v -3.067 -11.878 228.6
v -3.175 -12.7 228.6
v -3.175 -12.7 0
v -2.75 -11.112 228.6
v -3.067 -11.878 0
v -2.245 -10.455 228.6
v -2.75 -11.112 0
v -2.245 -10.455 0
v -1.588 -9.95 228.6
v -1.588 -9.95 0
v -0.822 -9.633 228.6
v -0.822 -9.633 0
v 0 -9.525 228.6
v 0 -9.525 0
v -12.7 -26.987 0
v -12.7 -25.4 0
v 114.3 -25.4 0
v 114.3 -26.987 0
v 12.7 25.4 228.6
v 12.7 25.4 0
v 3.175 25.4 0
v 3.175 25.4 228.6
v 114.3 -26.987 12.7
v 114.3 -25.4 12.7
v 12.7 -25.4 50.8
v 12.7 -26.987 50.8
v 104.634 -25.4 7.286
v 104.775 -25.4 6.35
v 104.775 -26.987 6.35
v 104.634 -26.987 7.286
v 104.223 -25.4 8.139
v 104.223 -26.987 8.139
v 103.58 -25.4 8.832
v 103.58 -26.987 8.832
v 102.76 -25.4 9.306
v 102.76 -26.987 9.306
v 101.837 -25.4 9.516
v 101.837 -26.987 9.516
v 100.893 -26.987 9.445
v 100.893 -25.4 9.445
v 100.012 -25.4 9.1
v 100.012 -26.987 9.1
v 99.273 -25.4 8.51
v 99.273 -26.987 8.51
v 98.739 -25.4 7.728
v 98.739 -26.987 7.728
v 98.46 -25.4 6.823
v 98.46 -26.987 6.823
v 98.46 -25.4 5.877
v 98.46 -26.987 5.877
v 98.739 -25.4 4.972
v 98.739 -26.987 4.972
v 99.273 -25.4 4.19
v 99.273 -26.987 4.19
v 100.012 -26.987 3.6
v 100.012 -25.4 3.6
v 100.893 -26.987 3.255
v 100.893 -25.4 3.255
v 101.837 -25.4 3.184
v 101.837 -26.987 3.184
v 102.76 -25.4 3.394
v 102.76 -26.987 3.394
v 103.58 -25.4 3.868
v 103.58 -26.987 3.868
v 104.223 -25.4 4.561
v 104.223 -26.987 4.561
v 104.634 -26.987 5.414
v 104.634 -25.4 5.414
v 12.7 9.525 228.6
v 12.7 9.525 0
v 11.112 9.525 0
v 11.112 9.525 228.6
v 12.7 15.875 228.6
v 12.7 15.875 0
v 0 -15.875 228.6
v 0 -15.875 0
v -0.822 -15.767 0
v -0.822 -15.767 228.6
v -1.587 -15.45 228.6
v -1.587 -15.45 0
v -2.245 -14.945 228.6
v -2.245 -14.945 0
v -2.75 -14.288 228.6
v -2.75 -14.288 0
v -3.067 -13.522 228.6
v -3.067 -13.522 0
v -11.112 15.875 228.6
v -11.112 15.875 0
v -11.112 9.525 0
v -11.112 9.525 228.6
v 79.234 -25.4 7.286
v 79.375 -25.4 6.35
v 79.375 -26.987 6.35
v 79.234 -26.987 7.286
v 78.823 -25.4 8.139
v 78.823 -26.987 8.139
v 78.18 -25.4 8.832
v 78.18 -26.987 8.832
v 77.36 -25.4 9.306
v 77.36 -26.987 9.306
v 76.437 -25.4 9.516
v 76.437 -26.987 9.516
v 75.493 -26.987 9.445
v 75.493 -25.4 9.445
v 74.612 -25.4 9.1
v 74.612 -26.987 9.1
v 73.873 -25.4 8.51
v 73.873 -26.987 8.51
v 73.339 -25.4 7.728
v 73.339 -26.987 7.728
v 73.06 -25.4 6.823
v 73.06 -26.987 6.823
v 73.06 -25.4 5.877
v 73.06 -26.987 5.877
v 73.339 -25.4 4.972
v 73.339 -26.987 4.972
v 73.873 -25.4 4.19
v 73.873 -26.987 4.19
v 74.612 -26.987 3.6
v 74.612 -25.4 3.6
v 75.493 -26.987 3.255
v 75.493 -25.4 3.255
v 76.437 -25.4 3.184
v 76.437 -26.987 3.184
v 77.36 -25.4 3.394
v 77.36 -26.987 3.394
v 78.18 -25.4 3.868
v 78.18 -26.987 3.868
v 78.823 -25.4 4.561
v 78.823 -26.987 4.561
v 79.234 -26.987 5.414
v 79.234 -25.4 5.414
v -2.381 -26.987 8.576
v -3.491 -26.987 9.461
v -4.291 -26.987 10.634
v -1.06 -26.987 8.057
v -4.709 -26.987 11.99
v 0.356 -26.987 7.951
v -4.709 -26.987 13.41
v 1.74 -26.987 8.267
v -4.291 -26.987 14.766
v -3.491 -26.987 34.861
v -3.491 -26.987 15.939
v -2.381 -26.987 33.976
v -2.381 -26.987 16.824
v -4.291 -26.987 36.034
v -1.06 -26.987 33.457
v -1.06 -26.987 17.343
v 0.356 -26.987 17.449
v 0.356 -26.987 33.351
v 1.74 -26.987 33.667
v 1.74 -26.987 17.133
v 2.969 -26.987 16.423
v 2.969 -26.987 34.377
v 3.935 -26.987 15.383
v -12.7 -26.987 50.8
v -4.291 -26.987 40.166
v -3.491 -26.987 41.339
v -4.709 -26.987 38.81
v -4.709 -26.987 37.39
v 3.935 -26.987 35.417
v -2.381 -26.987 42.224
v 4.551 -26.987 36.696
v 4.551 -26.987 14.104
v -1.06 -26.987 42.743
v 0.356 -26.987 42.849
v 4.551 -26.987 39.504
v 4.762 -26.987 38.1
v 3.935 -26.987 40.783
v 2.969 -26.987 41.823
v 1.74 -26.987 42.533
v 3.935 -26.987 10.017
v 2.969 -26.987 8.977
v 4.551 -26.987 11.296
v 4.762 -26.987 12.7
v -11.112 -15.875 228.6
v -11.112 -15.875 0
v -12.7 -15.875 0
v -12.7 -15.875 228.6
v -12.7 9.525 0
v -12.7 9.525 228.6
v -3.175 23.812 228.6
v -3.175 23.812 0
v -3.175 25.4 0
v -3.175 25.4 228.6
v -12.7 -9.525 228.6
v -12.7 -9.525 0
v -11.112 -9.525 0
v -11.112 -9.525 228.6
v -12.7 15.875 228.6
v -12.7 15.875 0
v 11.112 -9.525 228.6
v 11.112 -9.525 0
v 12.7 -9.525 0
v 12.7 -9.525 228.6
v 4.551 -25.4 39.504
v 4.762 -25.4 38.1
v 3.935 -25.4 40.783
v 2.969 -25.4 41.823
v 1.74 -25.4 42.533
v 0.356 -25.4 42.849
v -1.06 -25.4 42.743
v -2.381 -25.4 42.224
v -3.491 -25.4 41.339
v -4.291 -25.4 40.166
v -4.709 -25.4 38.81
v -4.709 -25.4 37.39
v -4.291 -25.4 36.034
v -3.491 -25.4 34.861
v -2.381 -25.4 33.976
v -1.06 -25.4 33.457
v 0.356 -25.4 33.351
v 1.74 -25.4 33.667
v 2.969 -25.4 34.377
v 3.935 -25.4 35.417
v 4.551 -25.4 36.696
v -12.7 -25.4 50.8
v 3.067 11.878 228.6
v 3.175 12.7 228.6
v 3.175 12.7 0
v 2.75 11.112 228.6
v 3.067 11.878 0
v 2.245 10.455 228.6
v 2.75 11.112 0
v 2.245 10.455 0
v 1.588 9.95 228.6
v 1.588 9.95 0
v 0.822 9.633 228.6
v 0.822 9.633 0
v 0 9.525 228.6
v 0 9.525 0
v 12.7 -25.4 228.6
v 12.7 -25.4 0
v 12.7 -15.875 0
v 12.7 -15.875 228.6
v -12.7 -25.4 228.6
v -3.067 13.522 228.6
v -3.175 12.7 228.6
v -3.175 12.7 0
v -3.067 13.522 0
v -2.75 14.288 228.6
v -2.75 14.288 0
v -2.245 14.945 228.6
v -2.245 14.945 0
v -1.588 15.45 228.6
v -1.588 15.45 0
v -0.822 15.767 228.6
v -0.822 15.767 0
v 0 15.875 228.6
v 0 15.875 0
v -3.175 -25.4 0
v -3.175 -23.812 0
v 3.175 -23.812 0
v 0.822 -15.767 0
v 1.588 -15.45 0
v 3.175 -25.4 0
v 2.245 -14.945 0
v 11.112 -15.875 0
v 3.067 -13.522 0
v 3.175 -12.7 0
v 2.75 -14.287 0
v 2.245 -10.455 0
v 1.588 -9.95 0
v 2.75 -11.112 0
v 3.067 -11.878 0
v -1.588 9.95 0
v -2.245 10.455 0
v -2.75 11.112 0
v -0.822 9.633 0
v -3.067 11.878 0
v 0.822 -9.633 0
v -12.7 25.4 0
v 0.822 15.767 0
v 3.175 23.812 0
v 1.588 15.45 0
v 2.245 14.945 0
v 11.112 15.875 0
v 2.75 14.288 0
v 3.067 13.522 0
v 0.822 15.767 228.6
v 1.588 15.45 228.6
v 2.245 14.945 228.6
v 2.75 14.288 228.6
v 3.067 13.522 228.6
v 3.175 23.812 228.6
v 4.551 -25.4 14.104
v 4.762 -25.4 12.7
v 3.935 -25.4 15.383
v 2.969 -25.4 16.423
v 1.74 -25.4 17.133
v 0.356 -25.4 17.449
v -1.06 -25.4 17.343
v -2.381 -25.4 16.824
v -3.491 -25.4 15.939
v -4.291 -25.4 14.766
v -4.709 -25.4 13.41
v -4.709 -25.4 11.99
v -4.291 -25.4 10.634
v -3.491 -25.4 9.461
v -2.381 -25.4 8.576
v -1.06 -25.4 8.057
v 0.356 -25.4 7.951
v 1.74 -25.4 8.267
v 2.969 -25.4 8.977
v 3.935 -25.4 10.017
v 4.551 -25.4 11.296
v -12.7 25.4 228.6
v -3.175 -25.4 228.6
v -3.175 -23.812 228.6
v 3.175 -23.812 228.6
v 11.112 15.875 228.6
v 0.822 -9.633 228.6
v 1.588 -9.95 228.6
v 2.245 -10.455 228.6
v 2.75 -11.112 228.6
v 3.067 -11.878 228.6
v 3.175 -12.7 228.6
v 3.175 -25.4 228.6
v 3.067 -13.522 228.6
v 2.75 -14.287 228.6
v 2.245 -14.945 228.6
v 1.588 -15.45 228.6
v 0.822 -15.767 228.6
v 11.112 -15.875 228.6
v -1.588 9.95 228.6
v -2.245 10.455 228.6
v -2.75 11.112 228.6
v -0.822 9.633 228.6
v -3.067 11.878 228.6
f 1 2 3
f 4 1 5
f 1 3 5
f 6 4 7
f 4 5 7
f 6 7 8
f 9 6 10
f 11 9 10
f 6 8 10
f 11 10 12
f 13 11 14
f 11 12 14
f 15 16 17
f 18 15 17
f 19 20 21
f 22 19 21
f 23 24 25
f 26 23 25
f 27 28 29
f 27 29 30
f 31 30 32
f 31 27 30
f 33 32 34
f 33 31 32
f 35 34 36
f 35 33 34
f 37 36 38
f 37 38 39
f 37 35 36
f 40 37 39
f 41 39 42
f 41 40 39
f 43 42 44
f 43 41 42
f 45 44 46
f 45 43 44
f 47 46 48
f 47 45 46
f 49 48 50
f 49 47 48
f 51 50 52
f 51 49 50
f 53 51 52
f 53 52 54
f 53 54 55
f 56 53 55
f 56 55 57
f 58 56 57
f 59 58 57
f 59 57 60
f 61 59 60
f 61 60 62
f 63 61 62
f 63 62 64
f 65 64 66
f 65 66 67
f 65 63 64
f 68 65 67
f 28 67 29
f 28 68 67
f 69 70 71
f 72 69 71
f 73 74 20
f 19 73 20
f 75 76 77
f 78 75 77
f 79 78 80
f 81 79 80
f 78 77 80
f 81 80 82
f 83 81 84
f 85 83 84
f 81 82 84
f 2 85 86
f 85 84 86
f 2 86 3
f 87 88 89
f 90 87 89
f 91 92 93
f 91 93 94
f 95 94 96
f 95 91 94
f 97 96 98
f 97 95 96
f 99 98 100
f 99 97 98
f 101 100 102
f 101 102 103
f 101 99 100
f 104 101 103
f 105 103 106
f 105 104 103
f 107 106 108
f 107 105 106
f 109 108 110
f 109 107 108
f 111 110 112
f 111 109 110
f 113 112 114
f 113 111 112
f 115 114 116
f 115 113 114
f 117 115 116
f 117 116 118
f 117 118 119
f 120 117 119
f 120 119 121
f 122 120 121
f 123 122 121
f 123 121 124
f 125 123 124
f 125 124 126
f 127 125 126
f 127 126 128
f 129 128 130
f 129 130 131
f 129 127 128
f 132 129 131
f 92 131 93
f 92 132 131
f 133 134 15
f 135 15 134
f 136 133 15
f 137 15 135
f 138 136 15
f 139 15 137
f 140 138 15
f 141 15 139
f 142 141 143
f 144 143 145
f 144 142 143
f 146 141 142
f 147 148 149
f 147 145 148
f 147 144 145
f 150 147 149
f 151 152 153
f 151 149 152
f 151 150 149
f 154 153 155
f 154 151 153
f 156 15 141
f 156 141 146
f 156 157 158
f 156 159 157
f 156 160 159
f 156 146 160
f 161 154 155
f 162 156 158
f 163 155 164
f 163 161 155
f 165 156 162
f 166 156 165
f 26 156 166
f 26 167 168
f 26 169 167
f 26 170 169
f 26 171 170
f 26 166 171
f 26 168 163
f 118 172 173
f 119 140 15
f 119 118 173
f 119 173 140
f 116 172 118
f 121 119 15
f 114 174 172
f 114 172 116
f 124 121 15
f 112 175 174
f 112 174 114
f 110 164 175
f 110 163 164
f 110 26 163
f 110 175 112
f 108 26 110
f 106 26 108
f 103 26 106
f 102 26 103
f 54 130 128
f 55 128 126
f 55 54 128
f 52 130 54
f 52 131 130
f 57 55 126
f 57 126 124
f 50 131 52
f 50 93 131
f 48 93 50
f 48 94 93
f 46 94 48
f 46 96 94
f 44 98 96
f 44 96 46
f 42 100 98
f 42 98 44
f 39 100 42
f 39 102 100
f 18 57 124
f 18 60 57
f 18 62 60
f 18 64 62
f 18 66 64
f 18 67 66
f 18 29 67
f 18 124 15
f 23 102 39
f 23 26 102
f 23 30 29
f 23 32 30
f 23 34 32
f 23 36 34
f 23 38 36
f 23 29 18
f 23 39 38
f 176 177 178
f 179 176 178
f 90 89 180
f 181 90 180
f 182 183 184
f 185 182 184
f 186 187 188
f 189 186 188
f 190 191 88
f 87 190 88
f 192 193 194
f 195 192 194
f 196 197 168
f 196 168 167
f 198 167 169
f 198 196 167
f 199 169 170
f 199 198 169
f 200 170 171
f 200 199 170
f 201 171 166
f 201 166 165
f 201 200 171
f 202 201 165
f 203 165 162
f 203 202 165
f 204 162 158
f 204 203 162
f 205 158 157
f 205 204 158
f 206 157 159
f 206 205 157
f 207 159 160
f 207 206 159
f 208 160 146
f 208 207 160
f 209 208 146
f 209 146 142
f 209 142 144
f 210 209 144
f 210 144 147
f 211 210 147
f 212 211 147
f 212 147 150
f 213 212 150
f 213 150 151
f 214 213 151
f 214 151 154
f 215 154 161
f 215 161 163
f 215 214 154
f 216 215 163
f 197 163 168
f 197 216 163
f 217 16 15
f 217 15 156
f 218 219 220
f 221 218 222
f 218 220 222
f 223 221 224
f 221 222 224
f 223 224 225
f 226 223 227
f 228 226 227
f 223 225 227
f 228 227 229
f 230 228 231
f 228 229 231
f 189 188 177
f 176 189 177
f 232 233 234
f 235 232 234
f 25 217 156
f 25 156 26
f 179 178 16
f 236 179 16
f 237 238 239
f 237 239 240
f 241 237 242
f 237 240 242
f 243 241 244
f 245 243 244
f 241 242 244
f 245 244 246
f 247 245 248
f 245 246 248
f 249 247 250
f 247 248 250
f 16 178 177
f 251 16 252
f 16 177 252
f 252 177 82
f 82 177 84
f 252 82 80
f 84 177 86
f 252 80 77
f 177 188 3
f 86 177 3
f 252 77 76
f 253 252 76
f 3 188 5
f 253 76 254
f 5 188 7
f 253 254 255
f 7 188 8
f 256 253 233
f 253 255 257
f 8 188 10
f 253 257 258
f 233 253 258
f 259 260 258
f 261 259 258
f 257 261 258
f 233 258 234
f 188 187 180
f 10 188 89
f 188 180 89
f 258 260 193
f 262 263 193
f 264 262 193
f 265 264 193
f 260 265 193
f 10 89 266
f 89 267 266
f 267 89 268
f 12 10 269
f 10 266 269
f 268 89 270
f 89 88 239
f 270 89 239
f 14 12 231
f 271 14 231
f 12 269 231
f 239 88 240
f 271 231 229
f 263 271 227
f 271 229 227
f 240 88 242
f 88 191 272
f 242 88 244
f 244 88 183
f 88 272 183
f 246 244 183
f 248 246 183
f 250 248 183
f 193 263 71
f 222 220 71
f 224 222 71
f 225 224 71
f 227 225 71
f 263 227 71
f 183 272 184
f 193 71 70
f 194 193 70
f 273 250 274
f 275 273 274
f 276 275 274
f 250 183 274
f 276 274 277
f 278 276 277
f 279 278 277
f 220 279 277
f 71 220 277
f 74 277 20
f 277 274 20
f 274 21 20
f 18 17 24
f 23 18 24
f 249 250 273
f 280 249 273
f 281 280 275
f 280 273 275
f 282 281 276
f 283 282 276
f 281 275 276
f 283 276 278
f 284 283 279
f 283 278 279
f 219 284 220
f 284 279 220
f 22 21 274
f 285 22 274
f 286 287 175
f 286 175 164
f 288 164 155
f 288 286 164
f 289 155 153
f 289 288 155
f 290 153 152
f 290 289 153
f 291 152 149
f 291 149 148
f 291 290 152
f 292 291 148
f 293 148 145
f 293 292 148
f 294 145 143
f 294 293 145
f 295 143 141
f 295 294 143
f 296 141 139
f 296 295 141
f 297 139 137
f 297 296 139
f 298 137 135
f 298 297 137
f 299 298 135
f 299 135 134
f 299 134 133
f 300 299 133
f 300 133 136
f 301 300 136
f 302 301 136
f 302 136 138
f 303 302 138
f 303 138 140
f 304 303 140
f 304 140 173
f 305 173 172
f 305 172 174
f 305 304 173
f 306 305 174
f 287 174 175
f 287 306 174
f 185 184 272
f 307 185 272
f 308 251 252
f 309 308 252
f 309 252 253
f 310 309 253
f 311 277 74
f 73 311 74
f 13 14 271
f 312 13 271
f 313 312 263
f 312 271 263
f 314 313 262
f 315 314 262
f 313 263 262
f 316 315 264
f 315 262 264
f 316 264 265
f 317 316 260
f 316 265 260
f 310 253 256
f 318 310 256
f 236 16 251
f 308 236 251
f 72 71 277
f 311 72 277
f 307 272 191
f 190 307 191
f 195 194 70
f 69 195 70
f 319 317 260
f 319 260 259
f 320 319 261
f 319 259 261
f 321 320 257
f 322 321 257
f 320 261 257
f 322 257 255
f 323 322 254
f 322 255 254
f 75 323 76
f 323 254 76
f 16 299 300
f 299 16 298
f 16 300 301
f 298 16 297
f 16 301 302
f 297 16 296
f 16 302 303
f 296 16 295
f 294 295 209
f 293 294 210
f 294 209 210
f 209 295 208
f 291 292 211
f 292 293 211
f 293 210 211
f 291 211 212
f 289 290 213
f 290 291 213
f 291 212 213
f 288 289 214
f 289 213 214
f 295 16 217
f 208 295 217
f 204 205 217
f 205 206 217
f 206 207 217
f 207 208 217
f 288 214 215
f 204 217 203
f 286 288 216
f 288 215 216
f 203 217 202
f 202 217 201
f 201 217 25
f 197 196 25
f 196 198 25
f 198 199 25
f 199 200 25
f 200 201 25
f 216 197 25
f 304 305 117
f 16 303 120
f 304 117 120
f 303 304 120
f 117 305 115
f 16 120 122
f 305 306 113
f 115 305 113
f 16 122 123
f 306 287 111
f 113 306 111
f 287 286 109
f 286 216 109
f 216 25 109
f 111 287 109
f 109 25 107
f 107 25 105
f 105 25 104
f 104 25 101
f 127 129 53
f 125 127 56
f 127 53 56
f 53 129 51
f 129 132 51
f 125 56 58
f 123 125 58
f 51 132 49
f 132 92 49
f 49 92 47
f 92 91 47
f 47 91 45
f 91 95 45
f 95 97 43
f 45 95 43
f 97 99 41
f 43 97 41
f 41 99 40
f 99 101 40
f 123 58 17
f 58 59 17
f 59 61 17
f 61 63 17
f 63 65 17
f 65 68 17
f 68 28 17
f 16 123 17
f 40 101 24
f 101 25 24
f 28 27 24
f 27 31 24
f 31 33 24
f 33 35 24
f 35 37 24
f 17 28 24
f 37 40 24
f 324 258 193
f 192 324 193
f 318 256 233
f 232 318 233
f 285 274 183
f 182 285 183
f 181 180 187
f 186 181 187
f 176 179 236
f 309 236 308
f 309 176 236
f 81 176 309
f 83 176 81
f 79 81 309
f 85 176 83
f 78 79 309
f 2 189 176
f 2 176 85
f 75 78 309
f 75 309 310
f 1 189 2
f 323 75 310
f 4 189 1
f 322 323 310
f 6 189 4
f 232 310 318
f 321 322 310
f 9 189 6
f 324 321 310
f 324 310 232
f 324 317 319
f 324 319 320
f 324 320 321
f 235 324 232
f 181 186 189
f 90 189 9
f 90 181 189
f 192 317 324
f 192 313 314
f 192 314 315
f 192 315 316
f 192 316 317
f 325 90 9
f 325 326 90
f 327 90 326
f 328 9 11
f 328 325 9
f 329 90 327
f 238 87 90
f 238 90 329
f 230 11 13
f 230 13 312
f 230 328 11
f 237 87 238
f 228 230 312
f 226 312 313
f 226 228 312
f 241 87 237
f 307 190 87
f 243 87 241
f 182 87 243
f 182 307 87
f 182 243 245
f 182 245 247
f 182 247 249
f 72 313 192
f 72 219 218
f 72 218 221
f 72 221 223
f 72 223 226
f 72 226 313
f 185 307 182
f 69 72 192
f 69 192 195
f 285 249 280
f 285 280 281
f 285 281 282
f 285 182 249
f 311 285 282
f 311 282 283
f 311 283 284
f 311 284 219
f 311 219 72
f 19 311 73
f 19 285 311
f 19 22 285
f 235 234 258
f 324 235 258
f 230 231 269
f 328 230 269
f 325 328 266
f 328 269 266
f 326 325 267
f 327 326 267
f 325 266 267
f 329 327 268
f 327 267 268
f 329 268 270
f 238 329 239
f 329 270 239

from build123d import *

# Parameters (mm, degrees)
F0_W     = 3.175
F0_H     = 1.5875
F0_W_2   = 7.9375
F0_H_2   = 7.9375
F1_DEPTH = 228.6
F0_W_3   = 50.8
F0_H_3   = 50.8
F0_W_4   = 19.05
F0_H_4   = 19.05
F2_DEPTH = 12.7
F3_W     = 25.4
F3_H     = 50.8
F3_R     = 4.7625
F3_W_2   = 50.8
F3_H_2   = 12.7
F3_R_2   = 3.175
F4_DEPTH = 1.5875


with BuildPart() as f1:
    # F0 (on Top) → F1 (new body)
    with BuildSketch(Plane.XY):
        Polygon((-12.7, -15.875), (-12.7, -25.4), (-3.175, -25.4), (-3.175, -23.8125), (-11.1125, -23.8125), (-11.1125, -15.875), align=None)
        Polygon((3.175, -23.8125), (3.175, -25.4), (12.7, -25.4), (12.7, -15.875), (11.1125, -15.875), (11.1125, -23.8125), align=None)
        Polygon((11.1125, -9.525), (12.7, -9.525), (12.7, 0), (3.175, 0), (3.175, -1.5875), (11.1125, -1.5875), align=None)
        Polygon((-12.7, 0), (-12.7, -9.525), (-11.1125, -9.525), (-11.1125, -1.5875), (-3.175, -1.5875), (-3.175, 0), align=None)
        Polygon((-12.7, 9.525), (-12.7, 0), (-3.175, 0), (-3.175, 1.5875), (-11.1125, 1.5875), (-11.1125, 9.525), align=None)
        with Locations((1.5875, 0.79375)):
            Rectangle(F0_W, F0_H)
        with Locations((-1.5875, 0.79375)):
            Rectangle(F0_W, F0_H)
        with Locations((-1.5875, -0.79375)):
            Rectangle(F0_W, F0_H)
        with Locations((1.5875, -0.79375)):
            Rectangle(F0_W, F0_H)
        Polygon((3.175, 1.5875), (3.175, 0), (12.7, 0), (12.7, 9.525), (11.1125, 9.525), (11.1125, 1.5875), align=None)
        with Locations((7.14375, 5.55625)):
            Rectangle(F0_W_2, F0_H_2)
        with Locations((-7.14375, 5.55625)):
            Rectangle(F0_W_2, F0_H_2)
        with Locations((-7.14375, -5.55625)):
            Rectangle(F0_W_2, F0_H_2)
        with Locations((7.14375, -5.55625)):
            Rectangle(F0_W_2, F0_H_2)
        with Locations((-7.14375, -19.84375)):
            Rectangle(F0_W_2, F0_H_2)
        with Locations((7.14375, -19.84375)):
            Rectangle(F0_W_2, F0_H_2)
        with Locations((-7.14375, 19.84375)):
            Rectangle(F0_W_2, F0_H_2)
        Polygon((11.1125, 15.875), (12.7, 15.875), (12.7, 25.4), (3.175, 25.4), (3.175, 23.8125), (11.1125, 23.8125), align=None)
        with Locations((7.14375, 19.84375)):
            Rectangle(F0_W_2, F0_H_2)
        Polygon((-12.7, 25.4), (-12.7, 15.875), (-11.1125, 15.875), (-11.1125, 23.8125), (-3.175, 23.8125), (-3.175, 25.4), align=None)
        with Locations((-1.5875, 19.84375)):
            Rectangle(F0_W, F0_H_2)
        with Locations((1.5875, 19.84375)):
            Rectangle(F0_W, F0_H_2)
        Polygon((-11.1125, -9.525), (-11.1125, -15.875), (-3.175, -15.875), (-3.175, -12.7), (-3.175, -9.525), align=None)
        with BuildLine():
            Line((-3.175, -9.525), (-3.175, -12.7))
            ThreePointArc((-3.175, -12.7), (-2.2450640303, -10.4549359697), (0, -9.525))
            Line((0, -9.525), (-3.175, -9.525))
        make_face()
        with Locations((-1.5875, -5.55625)):
            Rectangle(F0_W, F0_H_2)
        with Locations((1.5875, -5.55625)):
            Rectangle(F0_W, F0_H_2)
        with BuildLine():
            Line((3.175, -9.525), (0, -9.525))
            ThreePointArc((0, -9.525), (2.2450640303, -10.4549359697), (3.175, -12.7))
            Line((3.175, -12.7), (3.175, -9.525))
        make_face()
        Polygon((3.175, -12.7), (3.175, -15.875), (11.1125, -15.875), (11.1125, -9.525), (3.175, -9.525), align=None)
        with Locations((1.5875, -19.84375)):
            Rectangle(F0_W, F0_H_2)
        with Locations((-1.5875, -19.84375)):
            Rectangle(F0_W, F0_H_2)
        with BuildLine():
            Line((-3.175, -12.7), (-3.175, -15.875))
            Line((-3.175, -15.875), (5e-09, -15.875))
            ThreePointArc((5e-09, -15.875), (-2.2450640285, -14.945064032), (-3.175, -12.7))
        make_face()
        Polygon((-11.1125, 15.875), (-11.1125, 9.525), (-3.175, 9.525), (-3.175, 12.7), (-3.175, 15.875), align=None)
        with BuildLine():
            Line((-3.175, 12.7), (-3.175, 9.525))
            Line((-3.175, 9.525), (0, 9.525))
            ThreePointArc((0, 9.525), (-2.2450640303, 10.4549359697), (-3.175, 12.7))
        make_face()
        with BuildLine():
            ThreePointArc((3.175, 12.7), (2.2450640303, 10.4549359697), (0, 9.525))
            Line((0, 9.525), (3.175, 9.525))
            Line((3.175, 9.525), (3.175, 12.7))
        make_face()
        with BuildLine():
            Line((3.175, 15.875), (0, 15.875))
            ThreePointArc((0, 15.875), (2.2450640303, 14.9450640303), (3.175, 12.7))
            Line((3.175, 12.7), (3.175, 15.875))
        make_face()
        with BuildLine():
            Line((0, 15.875), (-3.175, 15.875))
            Line((-3.175, 15.875), (-3.175, 12.7))
            ThreePointArc((-3.175, 12.7), (-2.2450640303, 14.9450640303), (0, 15.875))
        make_face()
        Polygon((3.175, 15.875), (3.175, 12.7), (3.175, 9.525), (11.1125, 9.525), (11.1125, 15.875), align=None)
        with Locations((-1.5875, 5.55625)):
            Rectangle(F0_W, F0_H_2)
        with Locations((1.5875, 5.55625)):
            Rectangle(F0_W, F0_H_2)
        with BuildLine():
            ThreePointArc((3.175, -12.7), (2.245064032, -14.9450640285), (5e-09, -15.875))
            Line((5e-09, -15.875), (3.175, -15.875))
            Line((3.175, -15.875), (3.175, -12.7))
        make_face()
    extrude(amount=F1_DEPTH)


with BuildPart() as f2:
    # F0 (on Top) → F2 (new body)
    with BuildSketch(Plane.XY):
        with Locations((88.9, 0)):
            Rectangle(F0_W_3, F0_H_3)
        with Locations((88.9, 0)):
            Rectangle(F0_W_4, F0_H_4, mode=Mode.SUBTRACT)
    extrude(amount=F2_DEPTH)


with BuildPart() as f4:
    # F3 (on face) → F4 (new body)
    with BuildSketch(Plane.XZ.offset(25.4)):
        with Locations((0, 25.4)):
            Rectangle(F3_W, F3_H)
        with Locations((0, 12.7)):
            Circle(F3_R, mode=Mode.SUBTRACT)
        with Locations((0, 38.1)):
            Circle(F3_R, mode=Mode.SUBTRACT)
        Polygon((12.7, 50.8), (12.7, 0), (63.5, 0), (63.5, 12.7), (114.3, 12.7), align=None)
        with Locations((88.9, 6.35)):
            Rectangle(F3_W_2, F3_H_2)
        with Locations((76.2, 6.35)):
            Circle(F3_R_2, mode=Mode.SUBTRACT)
        with Locations((101.6, 6.35)):
            Circle(F3_R_2, mode=Mode.SUBTRACT)
    extrude(amount=F4_DEPTH)


solid = Compound([f1.part, f4.part])
